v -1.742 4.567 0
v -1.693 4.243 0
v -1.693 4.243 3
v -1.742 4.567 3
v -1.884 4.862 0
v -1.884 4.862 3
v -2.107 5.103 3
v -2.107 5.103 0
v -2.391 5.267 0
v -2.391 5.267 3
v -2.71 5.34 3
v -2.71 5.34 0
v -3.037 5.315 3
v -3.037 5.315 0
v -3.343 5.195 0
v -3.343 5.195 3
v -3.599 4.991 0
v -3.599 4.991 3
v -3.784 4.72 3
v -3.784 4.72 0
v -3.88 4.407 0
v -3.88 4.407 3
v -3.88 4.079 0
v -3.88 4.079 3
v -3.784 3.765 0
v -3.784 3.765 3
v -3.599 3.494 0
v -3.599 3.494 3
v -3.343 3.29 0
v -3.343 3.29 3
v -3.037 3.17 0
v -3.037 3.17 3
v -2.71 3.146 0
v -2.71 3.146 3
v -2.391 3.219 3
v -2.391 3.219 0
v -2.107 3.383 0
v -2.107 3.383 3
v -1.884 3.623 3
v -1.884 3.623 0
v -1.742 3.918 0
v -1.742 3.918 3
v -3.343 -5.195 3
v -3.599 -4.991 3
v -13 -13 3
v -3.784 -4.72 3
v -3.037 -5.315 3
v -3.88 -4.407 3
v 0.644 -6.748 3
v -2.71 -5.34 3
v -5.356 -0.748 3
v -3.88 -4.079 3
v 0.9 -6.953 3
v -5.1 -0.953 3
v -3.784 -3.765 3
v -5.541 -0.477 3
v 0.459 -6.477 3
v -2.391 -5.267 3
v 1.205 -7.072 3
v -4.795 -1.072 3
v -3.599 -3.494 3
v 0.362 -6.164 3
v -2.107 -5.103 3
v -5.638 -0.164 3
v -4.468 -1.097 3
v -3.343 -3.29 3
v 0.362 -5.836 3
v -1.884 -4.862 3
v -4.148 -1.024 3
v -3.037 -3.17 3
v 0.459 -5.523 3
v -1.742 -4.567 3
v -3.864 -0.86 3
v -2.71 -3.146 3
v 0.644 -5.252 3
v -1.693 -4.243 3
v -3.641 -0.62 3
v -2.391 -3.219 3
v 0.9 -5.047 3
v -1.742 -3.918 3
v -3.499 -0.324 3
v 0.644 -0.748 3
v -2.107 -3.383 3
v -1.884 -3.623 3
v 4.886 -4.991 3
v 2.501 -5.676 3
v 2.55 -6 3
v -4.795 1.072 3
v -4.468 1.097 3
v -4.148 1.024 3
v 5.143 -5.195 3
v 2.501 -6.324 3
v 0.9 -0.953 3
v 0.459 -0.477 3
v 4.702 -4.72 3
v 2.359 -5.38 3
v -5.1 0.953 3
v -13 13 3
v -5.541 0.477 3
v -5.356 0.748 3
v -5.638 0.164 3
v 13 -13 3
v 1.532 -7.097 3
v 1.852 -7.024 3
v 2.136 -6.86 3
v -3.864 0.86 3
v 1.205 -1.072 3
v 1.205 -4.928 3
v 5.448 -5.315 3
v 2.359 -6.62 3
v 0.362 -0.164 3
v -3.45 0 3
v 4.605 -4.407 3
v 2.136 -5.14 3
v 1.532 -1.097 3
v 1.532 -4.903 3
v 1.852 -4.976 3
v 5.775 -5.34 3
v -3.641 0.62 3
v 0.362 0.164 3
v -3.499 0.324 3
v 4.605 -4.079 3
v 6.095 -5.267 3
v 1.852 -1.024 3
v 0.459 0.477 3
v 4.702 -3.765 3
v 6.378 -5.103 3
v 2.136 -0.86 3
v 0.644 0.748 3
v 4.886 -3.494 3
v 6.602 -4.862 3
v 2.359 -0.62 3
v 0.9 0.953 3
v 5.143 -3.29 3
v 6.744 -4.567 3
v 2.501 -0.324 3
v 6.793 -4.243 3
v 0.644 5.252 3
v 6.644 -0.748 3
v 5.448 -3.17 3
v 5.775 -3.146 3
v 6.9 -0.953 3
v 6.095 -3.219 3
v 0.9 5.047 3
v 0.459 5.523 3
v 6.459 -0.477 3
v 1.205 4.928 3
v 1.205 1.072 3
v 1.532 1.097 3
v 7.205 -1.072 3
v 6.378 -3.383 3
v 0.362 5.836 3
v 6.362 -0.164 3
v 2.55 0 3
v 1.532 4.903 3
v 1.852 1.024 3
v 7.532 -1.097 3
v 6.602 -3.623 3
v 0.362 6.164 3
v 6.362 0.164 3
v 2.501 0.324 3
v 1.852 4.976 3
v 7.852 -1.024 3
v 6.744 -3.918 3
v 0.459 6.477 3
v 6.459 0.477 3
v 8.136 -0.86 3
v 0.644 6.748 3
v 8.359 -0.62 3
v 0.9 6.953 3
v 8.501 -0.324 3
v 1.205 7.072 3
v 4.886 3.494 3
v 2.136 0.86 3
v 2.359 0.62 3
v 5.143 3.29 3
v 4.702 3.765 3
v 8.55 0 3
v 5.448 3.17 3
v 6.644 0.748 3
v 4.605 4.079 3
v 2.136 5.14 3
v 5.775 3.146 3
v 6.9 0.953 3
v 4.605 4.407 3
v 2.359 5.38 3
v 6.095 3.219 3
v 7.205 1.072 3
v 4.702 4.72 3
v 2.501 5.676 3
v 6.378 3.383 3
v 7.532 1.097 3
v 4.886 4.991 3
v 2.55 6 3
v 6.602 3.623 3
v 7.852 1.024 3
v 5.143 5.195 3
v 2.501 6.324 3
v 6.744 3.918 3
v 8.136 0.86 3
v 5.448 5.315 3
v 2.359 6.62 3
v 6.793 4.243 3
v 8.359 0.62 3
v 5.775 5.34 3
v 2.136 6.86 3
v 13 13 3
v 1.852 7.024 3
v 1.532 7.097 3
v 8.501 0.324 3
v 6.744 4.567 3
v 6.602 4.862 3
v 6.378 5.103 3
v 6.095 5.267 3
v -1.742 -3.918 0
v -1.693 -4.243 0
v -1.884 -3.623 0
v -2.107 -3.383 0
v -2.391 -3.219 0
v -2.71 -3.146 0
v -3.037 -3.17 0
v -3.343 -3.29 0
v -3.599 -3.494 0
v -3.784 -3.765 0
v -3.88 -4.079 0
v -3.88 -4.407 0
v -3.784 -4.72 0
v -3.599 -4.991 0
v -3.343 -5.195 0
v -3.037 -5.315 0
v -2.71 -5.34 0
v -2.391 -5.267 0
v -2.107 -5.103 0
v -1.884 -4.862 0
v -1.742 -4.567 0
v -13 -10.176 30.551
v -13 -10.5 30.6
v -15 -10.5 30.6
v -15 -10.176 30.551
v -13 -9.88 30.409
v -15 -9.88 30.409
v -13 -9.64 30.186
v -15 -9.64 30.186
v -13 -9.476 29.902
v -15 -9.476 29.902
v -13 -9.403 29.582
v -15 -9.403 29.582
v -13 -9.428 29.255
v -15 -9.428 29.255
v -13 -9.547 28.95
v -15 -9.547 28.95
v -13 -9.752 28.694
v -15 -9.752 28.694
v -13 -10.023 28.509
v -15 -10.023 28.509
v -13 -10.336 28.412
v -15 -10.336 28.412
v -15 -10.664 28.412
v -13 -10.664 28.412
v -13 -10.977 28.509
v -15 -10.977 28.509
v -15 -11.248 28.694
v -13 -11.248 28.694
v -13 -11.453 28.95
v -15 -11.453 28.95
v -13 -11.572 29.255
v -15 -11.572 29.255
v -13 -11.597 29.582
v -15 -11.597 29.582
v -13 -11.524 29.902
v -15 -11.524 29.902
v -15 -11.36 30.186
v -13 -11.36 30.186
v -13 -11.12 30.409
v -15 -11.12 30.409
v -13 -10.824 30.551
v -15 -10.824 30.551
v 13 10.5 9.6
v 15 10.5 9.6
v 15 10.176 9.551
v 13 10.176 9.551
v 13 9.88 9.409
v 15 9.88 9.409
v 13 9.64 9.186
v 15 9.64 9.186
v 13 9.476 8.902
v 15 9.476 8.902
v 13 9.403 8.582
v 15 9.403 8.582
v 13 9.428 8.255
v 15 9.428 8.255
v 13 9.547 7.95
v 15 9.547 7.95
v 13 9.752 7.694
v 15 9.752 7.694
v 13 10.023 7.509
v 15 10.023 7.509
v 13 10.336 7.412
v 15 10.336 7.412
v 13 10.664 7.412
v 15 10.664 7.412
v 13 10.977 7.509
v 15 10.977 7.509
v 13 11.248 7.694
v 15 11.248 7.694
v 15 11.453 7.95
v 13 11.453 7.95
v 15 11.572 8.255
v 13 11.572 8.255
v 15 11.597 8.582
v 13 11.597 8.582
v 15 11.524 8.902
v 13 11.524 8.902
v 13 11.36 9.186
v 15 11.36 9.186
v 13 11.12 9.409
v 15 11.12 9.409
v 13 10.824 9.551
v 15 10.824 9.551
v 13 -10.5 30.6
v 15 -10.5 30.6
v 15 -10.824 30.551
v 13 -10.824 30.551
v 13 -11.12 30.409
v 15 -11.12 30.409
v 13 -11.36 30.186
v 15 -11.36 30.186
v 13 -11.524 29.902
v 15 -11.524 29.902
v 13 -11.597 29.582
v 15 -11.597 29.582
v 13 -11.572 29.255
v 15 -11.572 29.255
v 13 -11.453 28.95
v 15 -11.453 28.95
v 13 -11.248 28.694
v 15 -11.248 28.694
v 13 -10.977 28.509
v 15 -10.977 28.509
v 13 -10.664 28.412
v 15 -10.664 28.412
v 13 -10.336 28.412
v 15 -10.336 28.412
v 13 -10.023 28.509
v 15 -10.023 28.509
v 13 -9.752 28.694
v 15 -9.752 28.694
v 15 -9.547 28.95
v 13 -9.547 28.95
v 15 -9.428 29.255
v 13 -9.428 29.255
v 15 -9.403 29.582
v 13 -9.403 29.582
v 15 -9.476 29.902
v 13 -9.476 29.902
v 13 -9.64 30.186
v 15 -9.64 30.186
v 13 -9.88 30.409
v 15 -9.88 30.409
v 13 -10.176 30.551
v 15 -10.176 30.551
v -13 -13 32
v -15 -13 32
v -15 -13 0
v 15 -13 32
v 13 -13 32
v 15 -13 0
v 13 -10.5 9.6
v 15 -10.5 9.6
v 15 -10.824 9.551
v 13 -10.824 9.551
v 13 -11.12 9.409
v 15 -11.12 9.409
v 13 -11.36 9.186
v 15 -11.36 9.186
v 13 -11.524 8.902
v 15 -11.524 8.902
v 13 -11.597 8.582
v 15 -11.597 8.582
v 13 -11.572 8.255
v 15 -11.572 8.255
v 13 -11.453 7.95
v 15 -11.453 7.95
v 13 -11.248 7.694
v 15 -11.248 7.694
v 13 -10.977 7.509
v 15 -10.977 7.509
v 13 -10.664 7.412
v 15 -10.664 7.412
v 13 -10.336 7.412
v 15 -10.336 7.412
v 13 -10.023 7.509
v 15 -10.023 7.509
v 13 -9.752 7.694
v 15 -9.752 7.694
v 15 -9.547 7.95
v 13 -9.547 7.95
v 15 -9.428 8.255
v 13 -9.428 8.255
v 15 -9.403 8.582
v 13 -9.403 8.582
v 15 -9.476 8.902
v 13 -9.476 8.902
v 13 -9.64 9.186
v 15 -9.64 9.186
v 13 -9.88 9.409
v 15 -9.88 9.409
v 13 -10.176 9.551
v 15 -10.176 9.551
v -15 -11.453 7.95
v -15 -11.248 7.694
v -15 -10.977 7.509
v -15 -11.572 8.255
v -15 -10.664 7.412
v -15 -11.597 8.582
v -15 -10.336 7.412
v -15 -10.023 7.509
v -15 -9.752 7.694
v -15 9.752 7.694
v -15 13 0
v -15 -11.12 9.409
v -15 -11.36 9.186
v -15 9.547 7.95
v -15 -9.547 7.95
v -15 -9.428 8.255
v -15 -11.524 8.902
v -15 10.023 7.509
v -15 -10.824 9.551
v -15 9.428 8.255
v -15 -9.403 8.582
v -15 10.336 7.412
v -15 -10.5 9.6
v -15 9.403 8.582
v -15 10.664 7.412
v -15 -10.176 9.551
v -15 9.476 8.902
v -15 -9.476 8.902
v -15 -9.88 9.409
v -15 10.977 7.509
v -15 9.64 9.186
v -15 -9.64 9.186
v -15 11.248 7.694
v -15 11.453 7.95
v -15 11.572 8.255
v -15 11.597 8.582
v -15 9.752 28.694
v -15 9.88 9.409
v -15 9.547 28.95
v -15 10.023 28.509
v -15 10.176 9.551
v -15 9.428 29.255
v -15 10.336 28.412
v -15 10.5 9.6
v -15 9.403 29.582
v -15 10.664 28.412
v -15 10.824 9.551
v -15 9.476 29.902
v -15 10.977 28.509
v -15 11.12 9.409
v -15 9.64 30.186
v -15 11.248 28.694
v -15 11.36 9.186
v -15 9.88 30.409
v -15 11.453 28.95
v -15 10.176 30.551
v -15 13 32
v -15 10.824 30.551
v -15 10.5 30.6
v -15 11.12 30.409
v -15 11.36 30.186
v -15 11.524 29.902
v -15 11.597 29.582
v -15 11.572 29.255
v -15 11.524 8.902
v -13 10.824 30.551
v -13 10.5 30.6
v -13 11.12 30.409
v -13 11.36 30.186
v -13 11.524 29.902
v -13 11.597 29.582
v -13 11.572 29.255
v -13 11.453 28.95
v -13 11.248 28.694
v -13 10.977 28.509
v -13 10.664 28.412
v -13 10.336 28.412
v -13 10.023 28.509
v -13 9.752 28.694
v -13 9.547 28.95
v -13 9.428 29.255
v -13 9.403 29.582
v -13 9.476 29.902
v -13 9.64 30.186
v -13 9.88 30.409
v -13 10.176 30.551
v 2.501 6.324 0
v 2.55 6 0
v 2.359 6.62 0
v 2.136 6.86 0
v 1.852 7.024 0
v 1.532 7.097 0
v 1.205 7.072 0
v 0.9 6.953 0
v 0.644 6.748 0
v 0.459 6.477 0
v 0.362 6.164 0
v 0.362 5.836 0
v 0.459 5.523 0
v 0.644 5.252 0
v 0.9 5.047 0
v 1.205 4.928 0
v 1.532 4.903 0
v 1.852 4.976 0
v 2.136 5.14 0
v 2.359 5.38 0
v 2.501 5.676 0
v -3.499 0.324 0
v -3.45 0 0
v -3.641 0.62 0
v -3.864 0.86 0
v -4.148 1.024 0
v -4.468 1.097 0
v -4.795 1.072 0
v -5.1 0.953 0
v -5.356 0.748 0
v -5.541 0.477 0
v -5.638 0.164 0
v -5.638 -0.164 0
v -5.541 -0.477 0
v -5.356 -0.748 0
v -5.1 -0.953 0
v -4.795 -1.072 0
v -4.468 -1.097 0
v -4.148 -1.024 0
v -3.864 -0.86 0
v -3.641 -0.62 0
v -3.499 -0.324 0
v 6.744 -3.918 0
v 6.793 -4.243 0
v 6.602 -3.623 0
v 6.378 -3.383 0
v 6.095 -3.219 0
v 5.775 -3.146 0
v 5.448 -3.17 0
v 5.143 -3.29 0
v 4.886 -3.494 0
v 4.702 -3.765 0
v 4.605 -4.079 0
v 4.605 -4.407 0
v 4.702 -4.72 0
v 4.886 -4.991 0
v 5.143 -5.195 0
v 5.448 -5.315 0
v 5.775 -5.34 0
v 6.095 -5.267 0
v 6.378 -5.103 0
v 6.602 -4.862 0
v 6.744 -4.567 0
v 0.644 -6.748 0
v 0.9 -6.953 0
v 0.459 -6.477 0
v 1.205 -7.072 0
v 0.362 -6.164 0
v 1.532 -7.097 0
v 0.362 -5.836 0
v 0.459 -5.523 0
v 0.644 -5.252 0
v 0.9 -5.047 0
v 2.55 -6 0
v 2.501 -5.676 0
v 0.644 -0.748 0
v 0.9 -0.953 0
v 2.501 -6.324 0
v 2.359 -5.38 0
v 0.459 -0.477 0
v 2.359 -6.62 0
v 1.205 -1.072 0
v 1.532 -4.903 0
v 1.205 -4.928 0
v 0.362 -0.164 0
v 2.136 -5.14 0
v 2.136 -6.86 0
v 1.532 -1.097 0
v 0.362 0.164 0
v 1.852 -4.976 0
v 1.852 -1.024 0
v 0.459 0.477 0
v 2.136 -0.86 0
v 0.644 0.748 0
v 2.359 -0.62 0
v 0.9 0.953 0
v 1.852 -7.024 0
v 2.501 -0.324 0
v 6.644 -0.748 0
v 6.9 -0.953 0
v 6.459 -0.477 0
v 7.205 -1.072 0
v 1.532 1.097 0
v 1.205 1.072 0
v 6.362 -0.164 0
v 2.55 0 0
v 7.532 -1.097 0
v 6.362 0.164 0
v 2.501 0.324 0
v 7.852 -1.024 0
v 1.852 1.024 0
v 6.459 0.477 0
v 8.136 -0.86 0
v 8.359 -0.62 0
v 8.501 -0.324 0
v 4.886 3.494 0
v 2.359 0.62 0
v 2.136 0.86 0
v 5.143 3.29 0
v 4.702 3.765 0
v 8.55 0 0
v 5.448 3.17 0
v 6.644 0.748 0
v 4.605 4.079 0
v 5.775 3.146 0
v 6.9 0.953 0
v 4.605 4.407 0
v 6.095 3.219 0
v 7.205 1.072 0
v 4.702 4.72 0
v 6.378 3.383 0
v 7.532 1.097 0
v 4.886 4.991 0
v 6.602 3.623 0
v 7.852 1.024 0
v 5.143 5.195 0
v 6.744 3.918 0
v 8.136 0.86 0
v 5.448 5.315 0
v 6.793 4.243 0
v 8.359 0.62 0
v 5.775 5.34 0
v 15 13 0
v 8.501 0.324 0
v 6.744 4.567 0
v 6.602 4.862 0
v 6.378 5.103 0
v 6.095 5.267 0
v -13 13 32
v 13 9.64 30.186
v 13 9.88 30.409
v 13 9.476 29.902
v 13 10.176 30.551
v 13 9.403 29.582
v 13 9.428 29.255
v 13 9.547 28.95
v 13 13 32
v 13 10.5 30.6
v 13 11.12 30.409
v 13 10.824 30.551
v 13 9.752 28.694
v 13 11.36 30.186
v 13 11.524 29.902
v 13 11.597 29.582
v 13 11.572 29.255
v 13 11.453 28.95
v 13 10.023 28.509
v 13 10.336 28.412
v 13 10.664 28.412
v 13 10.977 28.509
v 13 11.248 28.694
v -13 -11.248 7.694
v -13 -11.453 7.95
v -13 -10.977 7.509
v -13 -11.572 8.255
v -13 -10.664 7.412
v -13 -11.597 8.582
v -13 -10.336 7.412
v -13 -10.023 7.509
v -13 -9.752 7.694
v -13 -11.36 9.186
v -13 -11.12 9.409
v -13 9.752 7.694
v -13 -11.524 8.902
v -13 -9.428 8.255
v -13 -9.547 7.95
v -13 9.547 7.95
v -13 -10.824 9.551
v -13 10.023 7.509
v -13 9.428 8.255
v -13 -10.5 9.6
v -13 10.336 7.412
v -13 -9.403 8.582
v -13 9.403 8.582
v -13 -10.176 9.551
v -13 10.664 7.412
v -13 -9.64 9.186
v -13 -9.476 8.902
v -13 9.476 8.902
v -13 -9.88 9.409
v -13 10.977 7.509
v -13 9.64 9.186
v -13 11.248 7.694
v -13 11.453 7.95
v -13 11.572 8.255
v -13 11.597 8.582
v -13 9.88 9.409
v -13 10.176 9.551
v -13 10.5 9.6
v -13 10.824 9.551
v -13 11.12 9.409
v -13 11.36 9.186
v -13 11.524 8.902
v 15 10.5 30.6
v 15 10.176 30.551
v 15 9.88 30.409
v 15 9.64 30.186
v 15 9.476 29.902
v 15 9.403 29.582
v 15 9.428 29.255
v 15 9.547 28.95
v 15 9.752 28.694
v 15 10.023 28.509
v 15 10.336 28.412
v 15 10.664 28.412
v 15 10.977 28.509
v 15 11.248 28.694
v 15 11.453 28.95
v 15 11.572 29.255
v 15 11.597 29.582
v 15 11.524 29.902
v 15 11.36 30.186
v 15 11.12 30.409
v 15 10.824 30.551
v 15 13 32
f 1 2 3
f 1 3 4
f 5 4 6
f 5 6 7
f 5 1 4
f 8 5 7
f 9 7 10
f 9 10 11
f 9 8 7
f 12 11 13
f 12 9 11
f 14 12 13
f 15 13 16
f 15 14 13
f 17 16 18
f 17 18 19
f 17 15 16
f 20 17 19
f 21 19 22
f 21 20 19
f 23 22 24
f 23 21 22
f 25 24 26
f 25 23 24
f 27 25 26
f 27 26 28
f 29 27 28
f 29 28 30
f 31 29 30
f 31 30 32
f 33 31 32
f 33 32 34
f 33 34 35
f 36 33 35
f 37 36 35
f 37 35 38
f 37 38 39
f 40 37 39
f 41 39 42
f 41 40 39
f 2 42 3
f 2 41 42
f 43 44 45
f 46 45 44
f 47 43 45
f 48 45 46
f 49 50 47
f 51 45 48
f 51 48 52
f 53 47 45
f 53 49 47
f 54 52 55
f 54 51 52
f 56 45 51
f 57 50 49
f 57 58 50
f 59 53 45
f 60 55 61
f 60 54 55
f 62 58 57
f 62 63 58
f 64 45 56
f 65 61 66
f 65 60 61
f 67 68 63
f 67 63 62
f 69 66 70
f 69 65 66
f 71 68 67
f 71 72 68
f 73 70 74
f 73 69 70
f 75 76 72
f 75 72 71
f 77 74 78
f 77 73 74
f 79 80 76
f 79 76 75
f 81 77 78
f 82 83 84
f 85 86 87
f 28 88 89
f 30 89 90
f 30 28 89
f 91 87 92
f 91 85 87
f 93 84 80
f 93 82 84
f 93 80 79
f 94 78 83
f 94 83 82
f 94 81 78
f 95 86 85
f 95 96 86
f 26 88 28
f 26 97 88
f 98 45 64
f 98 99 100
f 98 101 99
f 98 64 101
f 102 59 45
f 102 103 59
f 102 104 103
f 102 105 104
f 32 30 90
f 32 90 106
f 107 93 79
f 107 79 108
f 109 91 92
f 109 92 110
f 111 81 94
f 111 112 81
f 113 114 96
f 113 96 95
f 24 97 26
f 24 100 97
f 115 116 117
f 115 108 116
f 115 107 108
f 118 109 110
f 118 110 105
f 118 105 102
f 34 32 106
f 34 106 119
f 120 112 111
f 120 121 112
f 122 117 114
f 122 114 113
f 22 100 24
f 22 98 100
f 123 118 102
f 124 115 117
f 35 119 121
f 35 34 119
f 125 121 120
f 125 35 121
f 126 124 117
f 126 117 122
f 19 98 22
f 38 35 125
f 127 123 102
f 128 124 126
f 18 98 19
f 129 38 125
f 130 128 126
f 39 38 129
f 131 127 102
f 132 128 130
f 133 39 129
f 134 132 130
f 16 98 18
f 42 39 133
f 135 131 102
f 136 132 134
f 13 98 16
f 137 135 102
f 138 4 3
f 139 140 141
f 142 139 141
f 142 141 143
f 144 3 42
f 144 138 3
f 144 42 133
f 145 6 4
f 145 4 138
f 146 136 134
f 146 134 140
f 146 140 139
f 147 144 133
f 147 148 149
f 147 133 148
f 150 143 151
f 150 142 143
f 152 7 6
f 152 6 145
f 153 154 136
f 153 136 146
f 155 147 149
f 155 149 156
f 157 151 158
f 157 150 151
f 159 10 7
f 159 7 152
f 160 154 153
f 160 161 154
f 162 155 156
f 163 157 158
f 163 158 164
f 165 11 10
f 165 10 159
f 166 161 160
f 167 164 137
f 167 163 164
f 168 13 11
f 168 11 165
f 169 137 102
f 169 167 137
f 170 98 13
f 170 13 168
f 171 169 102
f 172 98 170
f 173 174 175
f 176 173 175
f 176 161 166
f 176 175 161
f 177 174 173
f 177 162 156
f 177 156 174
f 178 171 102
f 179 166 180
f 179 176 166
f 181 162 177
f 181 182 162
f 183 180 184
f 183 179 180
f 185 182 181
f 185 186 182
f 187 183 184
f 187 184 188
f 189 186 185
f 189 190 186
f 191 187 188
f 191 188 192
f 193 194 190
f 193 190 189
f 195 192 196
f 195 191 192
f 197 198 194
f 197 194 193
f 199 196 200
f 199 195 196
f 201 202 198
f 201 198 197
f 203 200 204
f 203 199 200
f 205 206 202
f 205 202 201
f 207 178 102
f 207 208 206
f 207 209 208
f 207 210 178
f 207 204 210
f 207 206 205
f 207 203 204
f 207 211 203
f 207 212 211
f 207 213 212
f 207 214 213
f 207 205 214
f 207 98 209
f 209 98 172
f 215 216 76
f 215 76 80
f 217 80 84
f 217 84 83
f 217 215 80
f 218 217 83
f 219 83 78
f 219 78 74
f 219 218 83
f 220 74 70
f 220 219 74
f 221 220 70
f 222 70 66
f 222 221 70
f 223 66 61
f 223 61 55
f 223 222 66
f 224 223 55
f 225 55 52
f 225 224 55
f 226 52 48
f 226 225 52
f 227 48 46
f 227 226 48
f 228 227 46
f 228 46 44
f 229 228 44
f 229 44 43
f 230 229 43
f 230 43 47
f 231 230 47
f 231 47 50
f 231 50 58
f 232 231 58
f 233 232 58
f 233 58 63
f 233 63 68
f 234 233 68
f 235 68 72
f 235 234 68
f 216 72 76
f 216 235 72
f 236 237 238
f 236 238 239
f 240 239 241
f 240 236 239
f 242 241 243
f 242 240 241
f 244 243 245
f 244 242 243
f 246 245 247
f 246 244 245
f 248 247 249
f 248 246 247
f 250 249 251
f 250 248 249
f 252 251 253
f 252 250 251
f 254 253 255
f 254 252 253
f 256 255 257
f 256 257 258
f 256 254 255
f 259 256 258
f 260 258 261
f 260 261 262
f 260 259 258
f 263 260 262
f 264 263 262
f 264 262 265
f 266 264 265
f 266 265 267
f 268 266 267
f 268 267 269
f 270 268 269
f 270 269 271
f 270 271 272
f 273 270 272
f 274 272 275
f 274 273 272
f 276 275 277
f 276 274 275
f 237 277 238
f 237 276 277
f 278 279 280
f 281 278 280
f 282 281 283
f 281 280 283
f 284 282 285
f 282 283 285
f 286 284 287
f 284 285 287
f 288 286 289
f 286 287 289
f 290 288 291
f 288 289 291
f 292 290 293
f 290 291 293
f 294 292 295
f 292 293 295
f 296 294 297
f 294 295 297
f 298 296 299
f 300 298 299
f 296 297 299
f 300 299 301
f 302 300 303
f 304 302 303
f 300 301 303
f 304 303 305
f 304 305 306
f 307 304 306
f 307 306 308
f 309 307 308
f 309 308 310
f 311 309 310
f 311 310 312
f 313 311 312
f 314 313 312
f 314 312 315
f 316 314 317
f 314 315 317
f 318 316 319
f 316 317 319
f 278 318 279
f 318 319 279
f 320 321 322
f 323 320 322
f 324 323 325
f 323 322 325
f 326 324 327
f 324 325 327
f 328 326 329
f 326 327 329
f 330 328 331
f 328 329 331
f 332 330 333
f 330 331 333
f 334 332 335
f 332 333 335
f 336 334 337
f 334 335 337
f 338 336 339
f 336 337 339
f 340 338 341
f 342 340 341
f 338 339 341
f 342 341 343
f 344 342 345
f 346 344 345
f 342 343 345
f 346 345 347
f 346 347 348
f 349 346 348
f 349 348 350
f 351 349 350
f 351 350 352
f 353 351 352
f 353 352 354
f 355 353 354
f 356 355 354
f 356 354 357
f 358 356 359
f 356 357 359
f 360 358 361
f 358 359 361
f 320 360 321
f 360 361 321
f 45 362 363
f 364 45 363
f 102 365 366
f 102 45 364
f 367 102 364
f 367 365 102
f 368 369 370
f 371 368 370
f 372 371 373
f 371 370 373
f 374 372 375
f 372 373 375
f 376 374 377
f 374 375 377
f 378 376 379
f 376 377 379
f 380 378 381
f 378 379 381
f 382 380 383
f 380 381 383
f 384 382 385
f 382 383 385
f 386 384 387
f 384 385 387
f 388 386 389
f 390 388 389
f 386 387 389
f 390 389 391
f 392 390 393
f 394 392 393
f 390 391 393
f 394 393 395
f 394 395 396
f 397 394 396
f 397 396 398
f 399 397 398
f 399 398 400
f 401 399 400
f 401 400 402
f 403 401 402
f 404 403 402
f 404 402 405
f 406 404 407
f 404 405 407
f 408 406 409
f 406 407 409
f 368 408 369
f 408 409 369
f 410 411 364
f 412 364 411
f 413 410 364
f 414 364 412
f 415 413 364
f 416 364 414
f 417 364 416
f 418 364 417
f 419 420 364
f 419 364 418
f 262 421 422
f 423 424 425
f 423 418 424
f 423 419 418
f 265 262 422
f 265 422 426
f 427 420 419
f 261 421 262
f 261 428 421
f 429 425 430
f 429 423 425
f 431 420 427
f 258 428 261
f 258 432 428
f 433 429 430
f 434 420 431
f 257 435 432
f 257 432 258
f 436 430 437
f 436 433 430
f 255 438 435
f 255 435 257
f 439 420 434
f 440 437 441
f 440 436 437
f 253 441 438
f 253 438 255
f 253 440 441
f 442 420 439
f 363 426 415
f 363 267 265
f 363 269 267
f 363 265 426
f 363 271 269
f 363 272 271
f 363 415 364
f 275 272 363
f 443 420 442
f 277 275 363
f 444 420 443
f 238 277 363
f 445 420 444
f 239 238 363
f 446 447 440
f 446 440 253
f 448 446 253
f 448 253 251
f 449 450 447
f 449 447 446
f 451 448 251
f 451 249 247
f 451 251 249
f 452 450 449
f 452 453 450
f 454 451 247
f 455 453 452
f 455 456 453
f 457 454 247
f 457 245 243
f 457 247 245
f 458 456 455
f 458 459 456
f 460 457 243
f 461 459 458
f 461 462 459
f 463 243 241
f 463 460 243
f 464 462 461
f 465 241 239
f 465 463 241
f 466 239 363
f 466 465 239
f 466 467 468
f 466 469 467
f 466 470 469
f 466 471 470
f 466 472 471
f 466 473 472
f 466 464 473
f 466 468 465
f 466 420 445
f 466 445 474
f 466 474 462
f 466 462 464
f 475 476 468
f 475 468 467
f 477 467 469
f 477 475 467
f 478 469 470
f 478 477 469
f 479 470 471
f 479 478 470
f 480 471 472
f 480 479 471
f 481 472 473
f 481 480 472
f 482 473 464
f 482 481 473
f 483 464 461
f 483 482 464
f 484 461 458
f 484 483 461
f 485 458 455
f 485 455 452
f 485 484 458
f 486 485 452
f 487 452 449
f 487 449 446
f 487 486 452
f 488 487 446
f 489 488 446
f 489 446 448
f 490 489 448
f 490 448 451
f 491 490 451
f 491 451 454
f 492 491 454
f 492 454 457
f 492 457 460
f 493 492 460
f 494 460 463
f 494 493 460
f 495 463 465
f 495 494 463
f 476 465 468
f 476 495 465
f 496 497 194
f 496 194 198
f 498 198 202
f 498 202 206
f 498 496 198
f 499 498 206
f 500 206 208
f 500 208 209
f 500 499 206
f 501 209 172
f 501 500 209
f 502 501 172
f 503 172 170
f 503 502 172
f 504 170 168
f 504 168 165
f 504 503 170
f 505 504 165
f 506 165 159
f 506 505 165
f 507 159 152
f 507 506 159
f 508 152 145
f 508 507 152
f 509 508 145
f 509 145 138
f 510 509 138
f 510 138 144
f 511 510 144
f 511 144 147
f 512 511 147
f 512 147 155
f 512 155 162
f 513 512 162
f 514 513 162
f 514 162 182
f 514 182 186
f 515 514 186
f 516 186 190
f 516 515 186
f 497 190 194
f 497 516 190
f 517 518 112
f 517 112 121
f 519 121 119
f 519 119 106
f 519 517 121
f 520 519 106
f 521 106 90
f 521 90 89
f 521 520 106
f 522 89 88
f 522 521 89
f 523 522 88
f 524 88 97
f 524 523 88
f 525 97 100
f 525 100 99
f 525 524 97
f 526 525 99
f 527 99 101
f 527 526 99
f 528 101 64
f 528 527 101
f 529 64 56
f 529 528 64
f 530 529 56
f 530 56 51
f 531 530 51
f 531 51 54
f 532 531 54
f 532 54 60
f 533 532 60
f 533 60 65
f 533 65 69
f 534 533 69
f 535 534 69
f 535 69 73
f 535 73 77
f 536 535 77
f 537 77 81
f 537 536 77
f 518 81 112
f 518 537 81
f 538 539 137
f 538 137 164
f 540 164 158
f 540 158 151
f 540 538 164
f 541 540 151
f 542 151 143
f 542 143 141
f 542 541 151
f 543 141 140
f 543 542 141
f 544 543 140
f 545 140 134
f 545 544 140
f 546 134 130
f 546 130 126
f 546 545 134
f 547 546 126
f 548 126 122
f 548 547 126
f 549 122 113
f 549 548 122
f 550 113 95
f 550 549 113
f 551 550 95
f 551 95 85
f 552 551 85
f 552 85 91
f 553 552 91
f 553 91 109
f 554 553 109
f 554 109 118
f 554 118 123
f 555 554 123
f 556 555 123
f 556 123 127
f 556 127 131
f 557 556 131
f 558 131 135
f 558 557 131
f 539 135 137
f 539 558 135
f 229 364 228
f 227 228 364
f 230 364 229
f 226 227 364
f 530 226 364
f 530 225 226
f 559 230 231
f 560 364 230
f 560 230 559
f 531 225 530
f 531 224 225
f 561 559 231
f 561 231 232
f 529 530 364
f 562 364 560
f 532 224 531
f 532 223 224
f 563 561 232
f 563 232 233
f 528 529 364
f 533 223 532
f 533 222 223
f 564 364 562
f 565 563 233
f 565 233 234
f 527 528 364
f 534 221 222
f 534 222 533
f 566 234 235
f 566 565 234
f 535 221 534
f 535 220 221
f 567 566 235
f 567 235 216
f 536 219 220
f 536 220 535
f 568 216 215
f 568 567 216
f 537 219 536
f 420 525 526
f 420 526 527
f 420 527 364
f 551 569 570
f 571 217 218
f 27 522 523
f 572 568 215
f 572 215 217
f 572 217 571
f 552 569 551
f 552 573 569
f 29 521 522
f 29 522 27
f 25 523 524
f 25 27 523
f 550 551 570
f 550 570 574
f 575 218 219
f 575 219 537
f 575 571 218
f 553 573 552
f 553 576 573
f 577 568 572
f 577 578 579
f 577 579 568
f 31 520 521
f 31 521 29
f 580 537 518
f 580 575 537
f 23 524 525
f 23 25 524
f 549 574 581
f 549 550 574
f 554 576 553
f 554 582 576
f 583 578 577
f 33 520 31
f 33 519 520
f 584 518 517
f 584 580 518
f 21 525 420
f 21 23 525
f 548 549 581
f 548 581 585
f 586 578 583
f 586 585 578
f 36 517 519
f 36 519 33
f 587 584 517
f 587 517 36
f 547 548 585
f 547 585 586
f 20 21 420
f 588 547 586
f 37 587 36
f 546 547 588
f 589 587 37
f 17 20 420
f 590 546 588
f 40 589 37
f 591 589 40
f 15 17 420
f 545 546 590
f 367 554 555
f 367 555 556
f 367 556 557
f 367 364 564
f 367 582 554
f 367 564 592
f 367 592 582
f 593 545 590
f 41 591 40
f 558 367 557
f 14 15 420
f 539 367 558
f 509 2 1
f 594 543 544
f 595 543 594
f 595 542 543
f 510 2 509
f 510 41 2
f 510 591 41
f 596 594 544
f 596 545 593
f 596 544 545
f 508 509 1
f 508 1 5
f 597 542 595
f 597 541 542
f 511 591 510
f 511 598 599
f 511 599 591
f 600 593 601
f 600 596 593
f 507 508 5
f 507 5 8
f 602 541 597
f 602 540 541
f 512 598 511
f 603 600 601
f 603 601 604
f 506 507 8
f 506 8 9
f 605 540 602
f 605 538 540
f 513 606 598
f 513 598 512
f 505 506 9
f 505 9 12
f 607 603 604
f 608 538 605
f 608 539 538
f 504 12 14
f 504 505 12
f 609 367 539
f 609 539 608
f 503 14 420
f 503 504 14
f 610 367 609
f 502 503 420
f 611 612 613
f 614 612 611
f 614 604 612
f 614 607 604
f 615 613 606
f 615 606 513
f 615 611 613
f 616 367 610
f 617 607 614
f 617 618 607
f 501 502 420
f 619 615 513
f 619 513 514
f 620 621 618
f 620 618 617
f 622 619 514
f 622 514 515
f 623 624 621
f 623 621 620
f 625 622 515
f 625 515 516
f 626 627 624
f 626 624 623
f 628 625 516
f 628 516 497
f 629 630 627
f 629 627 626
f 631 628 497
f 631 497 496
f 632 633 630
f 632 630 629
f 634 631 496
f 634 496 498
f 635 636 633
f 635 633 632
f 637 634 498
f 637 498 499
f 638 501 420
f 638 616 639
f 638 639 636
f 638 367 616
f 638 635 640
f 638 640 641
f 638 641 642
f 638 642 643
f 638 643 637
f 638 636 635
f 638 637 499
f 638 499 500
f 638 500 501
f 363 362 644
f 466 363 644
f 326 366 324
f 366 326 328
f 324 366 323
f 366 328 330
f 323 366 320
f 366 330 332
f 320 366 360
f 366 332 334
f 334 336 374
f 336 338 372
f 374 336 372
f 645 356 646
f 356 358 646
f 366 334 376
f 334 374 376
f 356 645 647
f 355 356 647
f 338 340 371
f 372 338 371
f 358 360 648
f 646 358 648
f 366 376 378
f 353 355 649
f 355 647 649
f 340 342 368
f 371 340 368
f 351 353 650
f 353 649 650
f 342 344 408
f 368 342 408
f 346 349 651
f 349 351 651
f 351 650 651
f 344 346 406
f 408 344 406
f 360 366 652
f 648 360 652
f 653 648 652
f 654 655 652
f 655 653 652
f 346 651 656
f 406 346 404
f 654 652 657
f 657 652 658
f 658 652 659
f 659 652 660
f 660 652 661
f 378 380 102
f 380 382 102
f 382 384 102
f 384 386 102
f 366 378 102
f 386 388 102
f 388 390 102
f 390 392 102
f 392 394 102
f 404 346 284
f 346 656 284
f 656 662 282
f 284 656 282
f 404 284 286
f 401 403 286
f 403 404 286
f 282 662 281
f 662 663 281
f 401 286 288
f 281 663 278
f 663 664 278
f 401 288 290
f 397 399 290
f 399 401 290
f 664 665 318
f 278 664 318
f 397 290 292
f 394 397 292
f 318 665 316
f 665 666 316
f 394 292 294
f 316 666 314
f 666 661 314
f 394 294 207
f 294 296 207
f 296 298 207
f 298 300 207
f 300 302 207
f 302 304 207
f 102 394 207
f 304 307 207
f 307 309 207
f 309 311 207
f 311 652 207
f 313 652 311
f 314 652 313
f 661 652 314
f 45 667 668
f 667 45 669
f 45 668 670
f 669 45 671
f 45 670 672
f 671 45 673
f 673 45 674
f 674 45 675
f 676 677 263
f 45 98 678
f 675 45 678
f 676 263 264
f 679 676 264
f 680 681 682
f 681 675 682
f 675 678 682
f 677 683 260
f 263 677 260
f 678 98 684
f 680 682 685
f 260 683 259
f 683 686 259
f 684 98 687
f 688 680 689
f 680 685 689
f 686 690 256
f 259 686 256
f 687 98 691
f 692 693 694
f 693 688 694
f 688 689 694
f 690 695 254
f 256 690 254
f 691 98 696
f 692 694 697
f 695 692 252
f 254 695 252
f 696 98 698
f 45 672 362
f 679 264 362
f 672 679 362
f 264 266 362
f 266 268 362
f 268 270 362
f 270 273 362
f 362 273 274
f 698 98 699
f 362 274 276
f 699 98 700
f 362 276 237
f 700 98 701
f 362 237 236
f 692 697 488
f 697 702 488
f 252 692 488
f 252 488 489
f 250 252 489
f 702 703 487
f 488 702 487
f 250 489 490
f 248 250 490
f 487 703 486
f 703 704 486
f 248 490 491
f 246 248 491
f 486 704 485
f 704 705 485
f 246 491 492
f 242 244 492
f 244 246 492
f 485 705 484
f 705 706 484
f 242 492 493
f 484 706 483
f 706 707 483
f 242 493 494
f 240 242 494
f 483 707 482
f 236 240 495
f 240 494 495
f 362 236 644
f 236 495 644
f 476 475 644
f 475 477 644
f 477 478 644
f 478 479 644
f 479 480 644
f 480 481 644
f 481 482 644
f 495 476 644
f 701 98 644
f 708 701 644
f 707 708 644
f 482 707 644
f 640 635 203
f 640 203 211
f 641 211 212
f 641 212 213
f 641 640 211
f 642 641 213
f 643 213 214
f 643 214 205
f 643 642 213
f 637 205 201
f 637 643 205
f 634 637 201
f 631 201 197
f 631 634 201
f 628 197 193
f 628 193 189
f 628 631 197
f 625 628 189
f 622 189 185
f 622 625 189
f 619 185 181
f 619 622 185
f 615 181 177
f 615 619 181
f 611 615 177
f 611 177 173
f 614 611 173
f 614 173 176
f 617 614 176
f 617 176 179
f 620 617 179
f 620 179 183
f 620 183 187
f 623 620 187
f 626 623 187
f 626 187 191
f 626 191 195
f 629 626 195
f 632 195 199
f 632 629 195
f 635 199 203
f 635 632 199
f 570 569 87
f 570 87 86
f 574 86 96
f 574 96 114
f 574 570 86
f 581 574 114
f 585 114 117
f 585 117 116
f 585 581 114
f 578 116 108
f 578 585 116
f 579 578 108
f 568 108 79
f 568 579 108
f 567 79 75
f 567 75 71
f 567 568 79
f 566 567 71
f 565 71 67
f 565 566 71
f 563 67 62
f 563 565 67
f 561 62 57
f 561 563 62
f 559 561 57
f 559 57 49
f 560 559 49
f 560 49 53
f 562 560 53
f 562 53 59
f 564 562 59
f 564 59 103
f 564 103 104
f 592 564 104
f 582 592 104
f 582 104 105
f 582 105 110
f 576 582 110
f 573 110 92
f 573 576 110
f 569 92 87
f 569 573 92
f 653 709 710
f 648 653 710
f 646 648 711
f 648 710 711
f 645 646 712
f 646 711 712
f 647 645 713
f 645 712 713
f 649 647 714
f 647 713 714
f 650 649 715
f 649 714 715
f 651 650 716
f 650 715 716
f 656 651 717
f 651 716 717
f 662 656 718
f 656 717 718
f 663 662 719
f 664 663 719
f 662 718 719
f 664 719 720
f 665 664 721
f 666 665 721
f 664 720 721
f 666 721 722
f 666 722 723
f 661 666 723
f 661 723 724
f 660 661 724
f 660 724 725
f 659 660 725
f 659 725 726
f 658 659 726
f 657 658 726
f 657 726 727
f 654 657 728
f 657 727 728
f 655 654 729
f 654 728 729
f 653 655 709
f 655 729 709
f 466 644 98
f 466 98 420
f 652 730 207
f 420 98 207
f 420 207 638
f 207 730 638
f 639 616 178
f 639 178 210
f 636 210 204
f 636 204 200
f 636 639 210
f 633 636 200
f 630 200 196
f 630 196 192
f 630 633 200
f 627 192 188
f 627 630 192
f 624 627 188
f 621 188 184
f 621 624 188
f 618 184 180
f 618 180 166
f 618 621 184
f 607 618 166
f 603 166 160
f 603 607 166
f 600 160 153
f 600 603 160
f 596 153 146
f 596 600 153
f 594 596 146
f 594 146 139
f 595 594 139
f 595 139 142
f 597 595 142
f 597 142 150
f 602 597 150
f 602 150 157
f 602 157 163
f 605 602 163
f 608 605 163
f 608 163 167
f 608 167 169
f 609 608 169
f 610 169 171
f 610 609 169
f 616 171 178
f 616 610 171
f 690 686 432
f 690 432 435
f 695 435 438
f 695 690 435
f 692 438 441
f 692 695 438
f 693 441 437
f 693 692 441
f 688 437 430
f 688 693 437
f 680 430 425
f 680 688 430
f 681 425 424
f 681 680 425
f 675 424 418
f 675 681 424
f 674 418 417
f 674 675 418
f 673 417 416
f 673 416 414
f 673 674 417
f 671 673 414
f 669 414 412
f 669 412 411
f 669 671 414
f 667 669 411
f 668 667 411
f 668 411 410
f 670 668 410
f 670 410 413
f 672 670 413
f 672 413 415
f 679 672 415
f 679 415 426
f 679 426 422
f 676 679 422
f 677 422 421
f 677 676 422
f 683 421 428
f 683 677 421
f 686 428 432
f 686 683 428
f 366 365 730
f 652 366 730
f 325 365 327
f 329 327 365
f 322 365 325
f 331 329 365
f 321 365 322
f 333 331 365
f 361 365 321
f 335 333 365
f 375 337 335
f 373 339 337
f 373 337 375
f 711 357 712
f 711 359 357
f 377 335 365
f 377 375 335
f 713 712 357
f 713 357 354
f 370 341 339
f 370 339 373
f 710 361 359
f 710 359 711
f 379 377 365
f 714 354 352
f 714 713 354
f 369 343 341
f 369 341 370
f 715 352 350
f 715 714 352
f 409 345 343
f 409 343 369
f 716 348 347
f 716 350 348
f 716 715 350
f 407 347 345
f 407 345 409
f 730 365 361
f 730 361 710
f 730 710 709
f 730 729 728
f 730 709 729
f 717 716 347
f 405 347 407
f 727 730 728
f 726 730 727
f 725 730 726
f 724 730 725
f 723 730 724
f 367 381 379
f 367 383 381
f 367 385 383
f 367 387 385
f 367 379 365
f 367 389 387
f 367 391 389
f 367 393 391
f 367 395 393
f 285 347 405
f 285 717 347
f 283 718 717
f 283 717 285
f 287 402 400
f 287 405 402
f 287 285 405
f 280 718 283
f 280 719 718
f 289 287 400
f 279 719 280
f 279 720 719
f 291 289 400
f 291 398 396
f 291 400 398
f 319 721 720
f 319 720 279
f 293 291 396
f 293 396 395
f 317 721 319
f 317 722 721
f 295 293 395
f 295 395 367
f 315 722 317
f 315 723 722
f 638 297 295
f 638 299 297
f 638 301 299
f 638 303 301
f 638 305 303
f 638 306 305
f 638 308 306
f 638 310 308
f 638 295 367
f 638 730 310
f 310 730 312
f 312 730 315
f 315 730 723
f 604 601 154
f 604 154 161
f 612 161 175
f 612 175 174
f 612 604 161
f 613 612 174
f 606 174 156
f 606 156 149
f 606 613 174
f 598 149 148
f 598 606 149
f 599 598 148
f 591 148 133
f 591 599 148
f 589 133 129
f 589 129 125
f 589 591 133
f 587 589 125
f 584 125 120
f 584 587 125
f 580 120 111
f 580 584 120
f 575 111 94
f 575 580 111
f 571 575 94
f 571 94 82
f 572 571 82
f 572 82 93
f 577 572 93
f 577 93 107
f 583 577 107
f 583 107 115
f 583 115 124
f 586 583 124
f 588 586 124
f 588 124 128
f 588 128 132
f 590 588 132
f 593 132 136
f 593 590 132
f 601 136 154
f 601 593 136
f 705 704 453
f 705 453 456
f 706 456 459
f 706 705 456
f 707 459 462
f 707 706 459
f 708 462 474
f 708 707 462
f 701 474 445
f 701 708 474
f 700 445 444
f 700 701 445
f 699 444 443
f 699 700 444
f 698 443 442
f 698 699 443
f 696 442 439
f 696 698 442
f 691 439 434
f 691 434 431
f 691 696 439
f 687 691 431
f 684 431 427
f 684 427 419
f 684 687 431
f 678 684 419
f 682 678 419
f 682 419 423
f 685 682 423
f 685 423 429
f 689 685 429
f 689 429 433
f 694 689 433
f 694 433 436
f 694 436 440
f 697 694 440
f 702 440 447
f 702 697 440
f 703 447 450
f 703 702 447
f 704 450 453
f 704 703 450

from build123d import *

# Parameters (mm, degrees)
SKETCH_1_W      = 26
SKETCH_1_H      = 26
SKETCH_1_R      = 1.1
EXTRUDE_1_DEPTH = 3
SKETCH_2_W      = 32
SKETCH_2_H      = 26
SKETCH_2_R      = 1.1
EXTRUDE_2_DEPTH = 2
EXTRUDE_START   = 2
SKETCH_3_W      = 32
SKETCH_3_H      = 26
SKETCH_3_R      = 1.1
EXTRUDE_3_DEPTH = 2


with BuildPart() as part:
    # ｽｹｯﾁ1 → ﾎﾞｽ - 押し出し1 (new body)
    with BuildSketch(Plane.XY):
        Rectangle(SKETCH_1_W, SKETCH_1_H)
        with Locations((1.45, 0)):
            Circle(SKETCH_1_R, mode=Mode.SUBTRACT)
        with Locations((1.45, 6)):
            Circle(SKETCH_1_R, mode=Mode.SUBTRACT)
        with Locations((5.692640687, 4.242640687)):
            Circle(SKETCH_1_R, mode=Mode.SUBTRACT)
        with Locations((7.45, 0)):
            Circle(SKETCH_1_R, mode=Mode.SUBTRACT)
        with Locations((5.692640687, -4.242640687)):
            Circle(SKETCH_1_R, mode=Mode.SUBTRACT)
        with Locations((1.45, -6)):
            Circle(SKETCH_1_R, mode=Mode.SUBTRACT)
        with Locations((-2.792640687, -4.242640687)):
            Circle(SKETCH_1_R, mode=Mode.SUBTRACT)
        with Locations((-4.55, 0)):
            Circle(SKETCH_1_R, mode=Mode.SUBTRACT)
        with Locations((-2.792640687, 4.242640687)):
            Circle(SKETCH_1_R, mode=Mode.SUBTRACT)
    extrude(amount=EXTRUDE_1_DEPTH)

    # ｽｹｯﾁ2 → ﾎﾞｽ - 押し出し2 (add)
    with BuildSketch(Plane.ZY.offset(13)):
        with Locations((16, 0)):
            Rectangle(SKETCH_2_W, SKETCH_2_H)
        with Locations((29.5, 10.5)):
            Circle(SKETCH_2_R, mode=Mode.SUBTRACT)
        with Locations((8.5, 10.5)):
            Circle(SKETCH_2_R, mode=Mode.SUBTRACT)
        with Locations((8.5, -10.5)):
            Circle(SKETCH_2_R, mode=Mode.SUBTRACT)
        with Locations((29.5, -10.5)):
            Circle(SKETCH_2_R, mode=Mode.SUBTRACT)
    extrude(amount=EXTRUDE_2_DEPTH)

    # ｽｹｯﾁ3 → ﾎﾞｽ - 押し出し3 (add)
    with BuildSketch(Plane(origin=(13, 0, 0), x_dir=(0, 0, -1), z_dir=(1, 0, 0)).offset(EXTRUDE_START)):
        with Locations((-16, 0)):
            Rectangle(SKETCH_3_W, SKETCH_3_H)
        with Locations(Location((-8.5, -10.5, 0), (0, 0, 180))):
            Circle(SKETCH_3_R, mode=Mode.SUBTRACT)
        with Locations(Location((-8.5, 10.5, 0), (0, 0, 180))):
            Circle(SKETCH_3_R, mode=Mode.SUBTRACT)
        with Locations(Location((-29.5, 10.5, 0), (0, 0, 180))):
            Circle(SKETCH_3_R, mode=Mode.SUBTRACT)
        with Locations(Location((-29.5, -10.5, 0), (0, 0, 180))):
            Circle(SKETCH_3_R, mode=Mode.SUBTRACT)
    extrude(amount=-EXTRUDE_3_DEPTH)


solid = part.part
